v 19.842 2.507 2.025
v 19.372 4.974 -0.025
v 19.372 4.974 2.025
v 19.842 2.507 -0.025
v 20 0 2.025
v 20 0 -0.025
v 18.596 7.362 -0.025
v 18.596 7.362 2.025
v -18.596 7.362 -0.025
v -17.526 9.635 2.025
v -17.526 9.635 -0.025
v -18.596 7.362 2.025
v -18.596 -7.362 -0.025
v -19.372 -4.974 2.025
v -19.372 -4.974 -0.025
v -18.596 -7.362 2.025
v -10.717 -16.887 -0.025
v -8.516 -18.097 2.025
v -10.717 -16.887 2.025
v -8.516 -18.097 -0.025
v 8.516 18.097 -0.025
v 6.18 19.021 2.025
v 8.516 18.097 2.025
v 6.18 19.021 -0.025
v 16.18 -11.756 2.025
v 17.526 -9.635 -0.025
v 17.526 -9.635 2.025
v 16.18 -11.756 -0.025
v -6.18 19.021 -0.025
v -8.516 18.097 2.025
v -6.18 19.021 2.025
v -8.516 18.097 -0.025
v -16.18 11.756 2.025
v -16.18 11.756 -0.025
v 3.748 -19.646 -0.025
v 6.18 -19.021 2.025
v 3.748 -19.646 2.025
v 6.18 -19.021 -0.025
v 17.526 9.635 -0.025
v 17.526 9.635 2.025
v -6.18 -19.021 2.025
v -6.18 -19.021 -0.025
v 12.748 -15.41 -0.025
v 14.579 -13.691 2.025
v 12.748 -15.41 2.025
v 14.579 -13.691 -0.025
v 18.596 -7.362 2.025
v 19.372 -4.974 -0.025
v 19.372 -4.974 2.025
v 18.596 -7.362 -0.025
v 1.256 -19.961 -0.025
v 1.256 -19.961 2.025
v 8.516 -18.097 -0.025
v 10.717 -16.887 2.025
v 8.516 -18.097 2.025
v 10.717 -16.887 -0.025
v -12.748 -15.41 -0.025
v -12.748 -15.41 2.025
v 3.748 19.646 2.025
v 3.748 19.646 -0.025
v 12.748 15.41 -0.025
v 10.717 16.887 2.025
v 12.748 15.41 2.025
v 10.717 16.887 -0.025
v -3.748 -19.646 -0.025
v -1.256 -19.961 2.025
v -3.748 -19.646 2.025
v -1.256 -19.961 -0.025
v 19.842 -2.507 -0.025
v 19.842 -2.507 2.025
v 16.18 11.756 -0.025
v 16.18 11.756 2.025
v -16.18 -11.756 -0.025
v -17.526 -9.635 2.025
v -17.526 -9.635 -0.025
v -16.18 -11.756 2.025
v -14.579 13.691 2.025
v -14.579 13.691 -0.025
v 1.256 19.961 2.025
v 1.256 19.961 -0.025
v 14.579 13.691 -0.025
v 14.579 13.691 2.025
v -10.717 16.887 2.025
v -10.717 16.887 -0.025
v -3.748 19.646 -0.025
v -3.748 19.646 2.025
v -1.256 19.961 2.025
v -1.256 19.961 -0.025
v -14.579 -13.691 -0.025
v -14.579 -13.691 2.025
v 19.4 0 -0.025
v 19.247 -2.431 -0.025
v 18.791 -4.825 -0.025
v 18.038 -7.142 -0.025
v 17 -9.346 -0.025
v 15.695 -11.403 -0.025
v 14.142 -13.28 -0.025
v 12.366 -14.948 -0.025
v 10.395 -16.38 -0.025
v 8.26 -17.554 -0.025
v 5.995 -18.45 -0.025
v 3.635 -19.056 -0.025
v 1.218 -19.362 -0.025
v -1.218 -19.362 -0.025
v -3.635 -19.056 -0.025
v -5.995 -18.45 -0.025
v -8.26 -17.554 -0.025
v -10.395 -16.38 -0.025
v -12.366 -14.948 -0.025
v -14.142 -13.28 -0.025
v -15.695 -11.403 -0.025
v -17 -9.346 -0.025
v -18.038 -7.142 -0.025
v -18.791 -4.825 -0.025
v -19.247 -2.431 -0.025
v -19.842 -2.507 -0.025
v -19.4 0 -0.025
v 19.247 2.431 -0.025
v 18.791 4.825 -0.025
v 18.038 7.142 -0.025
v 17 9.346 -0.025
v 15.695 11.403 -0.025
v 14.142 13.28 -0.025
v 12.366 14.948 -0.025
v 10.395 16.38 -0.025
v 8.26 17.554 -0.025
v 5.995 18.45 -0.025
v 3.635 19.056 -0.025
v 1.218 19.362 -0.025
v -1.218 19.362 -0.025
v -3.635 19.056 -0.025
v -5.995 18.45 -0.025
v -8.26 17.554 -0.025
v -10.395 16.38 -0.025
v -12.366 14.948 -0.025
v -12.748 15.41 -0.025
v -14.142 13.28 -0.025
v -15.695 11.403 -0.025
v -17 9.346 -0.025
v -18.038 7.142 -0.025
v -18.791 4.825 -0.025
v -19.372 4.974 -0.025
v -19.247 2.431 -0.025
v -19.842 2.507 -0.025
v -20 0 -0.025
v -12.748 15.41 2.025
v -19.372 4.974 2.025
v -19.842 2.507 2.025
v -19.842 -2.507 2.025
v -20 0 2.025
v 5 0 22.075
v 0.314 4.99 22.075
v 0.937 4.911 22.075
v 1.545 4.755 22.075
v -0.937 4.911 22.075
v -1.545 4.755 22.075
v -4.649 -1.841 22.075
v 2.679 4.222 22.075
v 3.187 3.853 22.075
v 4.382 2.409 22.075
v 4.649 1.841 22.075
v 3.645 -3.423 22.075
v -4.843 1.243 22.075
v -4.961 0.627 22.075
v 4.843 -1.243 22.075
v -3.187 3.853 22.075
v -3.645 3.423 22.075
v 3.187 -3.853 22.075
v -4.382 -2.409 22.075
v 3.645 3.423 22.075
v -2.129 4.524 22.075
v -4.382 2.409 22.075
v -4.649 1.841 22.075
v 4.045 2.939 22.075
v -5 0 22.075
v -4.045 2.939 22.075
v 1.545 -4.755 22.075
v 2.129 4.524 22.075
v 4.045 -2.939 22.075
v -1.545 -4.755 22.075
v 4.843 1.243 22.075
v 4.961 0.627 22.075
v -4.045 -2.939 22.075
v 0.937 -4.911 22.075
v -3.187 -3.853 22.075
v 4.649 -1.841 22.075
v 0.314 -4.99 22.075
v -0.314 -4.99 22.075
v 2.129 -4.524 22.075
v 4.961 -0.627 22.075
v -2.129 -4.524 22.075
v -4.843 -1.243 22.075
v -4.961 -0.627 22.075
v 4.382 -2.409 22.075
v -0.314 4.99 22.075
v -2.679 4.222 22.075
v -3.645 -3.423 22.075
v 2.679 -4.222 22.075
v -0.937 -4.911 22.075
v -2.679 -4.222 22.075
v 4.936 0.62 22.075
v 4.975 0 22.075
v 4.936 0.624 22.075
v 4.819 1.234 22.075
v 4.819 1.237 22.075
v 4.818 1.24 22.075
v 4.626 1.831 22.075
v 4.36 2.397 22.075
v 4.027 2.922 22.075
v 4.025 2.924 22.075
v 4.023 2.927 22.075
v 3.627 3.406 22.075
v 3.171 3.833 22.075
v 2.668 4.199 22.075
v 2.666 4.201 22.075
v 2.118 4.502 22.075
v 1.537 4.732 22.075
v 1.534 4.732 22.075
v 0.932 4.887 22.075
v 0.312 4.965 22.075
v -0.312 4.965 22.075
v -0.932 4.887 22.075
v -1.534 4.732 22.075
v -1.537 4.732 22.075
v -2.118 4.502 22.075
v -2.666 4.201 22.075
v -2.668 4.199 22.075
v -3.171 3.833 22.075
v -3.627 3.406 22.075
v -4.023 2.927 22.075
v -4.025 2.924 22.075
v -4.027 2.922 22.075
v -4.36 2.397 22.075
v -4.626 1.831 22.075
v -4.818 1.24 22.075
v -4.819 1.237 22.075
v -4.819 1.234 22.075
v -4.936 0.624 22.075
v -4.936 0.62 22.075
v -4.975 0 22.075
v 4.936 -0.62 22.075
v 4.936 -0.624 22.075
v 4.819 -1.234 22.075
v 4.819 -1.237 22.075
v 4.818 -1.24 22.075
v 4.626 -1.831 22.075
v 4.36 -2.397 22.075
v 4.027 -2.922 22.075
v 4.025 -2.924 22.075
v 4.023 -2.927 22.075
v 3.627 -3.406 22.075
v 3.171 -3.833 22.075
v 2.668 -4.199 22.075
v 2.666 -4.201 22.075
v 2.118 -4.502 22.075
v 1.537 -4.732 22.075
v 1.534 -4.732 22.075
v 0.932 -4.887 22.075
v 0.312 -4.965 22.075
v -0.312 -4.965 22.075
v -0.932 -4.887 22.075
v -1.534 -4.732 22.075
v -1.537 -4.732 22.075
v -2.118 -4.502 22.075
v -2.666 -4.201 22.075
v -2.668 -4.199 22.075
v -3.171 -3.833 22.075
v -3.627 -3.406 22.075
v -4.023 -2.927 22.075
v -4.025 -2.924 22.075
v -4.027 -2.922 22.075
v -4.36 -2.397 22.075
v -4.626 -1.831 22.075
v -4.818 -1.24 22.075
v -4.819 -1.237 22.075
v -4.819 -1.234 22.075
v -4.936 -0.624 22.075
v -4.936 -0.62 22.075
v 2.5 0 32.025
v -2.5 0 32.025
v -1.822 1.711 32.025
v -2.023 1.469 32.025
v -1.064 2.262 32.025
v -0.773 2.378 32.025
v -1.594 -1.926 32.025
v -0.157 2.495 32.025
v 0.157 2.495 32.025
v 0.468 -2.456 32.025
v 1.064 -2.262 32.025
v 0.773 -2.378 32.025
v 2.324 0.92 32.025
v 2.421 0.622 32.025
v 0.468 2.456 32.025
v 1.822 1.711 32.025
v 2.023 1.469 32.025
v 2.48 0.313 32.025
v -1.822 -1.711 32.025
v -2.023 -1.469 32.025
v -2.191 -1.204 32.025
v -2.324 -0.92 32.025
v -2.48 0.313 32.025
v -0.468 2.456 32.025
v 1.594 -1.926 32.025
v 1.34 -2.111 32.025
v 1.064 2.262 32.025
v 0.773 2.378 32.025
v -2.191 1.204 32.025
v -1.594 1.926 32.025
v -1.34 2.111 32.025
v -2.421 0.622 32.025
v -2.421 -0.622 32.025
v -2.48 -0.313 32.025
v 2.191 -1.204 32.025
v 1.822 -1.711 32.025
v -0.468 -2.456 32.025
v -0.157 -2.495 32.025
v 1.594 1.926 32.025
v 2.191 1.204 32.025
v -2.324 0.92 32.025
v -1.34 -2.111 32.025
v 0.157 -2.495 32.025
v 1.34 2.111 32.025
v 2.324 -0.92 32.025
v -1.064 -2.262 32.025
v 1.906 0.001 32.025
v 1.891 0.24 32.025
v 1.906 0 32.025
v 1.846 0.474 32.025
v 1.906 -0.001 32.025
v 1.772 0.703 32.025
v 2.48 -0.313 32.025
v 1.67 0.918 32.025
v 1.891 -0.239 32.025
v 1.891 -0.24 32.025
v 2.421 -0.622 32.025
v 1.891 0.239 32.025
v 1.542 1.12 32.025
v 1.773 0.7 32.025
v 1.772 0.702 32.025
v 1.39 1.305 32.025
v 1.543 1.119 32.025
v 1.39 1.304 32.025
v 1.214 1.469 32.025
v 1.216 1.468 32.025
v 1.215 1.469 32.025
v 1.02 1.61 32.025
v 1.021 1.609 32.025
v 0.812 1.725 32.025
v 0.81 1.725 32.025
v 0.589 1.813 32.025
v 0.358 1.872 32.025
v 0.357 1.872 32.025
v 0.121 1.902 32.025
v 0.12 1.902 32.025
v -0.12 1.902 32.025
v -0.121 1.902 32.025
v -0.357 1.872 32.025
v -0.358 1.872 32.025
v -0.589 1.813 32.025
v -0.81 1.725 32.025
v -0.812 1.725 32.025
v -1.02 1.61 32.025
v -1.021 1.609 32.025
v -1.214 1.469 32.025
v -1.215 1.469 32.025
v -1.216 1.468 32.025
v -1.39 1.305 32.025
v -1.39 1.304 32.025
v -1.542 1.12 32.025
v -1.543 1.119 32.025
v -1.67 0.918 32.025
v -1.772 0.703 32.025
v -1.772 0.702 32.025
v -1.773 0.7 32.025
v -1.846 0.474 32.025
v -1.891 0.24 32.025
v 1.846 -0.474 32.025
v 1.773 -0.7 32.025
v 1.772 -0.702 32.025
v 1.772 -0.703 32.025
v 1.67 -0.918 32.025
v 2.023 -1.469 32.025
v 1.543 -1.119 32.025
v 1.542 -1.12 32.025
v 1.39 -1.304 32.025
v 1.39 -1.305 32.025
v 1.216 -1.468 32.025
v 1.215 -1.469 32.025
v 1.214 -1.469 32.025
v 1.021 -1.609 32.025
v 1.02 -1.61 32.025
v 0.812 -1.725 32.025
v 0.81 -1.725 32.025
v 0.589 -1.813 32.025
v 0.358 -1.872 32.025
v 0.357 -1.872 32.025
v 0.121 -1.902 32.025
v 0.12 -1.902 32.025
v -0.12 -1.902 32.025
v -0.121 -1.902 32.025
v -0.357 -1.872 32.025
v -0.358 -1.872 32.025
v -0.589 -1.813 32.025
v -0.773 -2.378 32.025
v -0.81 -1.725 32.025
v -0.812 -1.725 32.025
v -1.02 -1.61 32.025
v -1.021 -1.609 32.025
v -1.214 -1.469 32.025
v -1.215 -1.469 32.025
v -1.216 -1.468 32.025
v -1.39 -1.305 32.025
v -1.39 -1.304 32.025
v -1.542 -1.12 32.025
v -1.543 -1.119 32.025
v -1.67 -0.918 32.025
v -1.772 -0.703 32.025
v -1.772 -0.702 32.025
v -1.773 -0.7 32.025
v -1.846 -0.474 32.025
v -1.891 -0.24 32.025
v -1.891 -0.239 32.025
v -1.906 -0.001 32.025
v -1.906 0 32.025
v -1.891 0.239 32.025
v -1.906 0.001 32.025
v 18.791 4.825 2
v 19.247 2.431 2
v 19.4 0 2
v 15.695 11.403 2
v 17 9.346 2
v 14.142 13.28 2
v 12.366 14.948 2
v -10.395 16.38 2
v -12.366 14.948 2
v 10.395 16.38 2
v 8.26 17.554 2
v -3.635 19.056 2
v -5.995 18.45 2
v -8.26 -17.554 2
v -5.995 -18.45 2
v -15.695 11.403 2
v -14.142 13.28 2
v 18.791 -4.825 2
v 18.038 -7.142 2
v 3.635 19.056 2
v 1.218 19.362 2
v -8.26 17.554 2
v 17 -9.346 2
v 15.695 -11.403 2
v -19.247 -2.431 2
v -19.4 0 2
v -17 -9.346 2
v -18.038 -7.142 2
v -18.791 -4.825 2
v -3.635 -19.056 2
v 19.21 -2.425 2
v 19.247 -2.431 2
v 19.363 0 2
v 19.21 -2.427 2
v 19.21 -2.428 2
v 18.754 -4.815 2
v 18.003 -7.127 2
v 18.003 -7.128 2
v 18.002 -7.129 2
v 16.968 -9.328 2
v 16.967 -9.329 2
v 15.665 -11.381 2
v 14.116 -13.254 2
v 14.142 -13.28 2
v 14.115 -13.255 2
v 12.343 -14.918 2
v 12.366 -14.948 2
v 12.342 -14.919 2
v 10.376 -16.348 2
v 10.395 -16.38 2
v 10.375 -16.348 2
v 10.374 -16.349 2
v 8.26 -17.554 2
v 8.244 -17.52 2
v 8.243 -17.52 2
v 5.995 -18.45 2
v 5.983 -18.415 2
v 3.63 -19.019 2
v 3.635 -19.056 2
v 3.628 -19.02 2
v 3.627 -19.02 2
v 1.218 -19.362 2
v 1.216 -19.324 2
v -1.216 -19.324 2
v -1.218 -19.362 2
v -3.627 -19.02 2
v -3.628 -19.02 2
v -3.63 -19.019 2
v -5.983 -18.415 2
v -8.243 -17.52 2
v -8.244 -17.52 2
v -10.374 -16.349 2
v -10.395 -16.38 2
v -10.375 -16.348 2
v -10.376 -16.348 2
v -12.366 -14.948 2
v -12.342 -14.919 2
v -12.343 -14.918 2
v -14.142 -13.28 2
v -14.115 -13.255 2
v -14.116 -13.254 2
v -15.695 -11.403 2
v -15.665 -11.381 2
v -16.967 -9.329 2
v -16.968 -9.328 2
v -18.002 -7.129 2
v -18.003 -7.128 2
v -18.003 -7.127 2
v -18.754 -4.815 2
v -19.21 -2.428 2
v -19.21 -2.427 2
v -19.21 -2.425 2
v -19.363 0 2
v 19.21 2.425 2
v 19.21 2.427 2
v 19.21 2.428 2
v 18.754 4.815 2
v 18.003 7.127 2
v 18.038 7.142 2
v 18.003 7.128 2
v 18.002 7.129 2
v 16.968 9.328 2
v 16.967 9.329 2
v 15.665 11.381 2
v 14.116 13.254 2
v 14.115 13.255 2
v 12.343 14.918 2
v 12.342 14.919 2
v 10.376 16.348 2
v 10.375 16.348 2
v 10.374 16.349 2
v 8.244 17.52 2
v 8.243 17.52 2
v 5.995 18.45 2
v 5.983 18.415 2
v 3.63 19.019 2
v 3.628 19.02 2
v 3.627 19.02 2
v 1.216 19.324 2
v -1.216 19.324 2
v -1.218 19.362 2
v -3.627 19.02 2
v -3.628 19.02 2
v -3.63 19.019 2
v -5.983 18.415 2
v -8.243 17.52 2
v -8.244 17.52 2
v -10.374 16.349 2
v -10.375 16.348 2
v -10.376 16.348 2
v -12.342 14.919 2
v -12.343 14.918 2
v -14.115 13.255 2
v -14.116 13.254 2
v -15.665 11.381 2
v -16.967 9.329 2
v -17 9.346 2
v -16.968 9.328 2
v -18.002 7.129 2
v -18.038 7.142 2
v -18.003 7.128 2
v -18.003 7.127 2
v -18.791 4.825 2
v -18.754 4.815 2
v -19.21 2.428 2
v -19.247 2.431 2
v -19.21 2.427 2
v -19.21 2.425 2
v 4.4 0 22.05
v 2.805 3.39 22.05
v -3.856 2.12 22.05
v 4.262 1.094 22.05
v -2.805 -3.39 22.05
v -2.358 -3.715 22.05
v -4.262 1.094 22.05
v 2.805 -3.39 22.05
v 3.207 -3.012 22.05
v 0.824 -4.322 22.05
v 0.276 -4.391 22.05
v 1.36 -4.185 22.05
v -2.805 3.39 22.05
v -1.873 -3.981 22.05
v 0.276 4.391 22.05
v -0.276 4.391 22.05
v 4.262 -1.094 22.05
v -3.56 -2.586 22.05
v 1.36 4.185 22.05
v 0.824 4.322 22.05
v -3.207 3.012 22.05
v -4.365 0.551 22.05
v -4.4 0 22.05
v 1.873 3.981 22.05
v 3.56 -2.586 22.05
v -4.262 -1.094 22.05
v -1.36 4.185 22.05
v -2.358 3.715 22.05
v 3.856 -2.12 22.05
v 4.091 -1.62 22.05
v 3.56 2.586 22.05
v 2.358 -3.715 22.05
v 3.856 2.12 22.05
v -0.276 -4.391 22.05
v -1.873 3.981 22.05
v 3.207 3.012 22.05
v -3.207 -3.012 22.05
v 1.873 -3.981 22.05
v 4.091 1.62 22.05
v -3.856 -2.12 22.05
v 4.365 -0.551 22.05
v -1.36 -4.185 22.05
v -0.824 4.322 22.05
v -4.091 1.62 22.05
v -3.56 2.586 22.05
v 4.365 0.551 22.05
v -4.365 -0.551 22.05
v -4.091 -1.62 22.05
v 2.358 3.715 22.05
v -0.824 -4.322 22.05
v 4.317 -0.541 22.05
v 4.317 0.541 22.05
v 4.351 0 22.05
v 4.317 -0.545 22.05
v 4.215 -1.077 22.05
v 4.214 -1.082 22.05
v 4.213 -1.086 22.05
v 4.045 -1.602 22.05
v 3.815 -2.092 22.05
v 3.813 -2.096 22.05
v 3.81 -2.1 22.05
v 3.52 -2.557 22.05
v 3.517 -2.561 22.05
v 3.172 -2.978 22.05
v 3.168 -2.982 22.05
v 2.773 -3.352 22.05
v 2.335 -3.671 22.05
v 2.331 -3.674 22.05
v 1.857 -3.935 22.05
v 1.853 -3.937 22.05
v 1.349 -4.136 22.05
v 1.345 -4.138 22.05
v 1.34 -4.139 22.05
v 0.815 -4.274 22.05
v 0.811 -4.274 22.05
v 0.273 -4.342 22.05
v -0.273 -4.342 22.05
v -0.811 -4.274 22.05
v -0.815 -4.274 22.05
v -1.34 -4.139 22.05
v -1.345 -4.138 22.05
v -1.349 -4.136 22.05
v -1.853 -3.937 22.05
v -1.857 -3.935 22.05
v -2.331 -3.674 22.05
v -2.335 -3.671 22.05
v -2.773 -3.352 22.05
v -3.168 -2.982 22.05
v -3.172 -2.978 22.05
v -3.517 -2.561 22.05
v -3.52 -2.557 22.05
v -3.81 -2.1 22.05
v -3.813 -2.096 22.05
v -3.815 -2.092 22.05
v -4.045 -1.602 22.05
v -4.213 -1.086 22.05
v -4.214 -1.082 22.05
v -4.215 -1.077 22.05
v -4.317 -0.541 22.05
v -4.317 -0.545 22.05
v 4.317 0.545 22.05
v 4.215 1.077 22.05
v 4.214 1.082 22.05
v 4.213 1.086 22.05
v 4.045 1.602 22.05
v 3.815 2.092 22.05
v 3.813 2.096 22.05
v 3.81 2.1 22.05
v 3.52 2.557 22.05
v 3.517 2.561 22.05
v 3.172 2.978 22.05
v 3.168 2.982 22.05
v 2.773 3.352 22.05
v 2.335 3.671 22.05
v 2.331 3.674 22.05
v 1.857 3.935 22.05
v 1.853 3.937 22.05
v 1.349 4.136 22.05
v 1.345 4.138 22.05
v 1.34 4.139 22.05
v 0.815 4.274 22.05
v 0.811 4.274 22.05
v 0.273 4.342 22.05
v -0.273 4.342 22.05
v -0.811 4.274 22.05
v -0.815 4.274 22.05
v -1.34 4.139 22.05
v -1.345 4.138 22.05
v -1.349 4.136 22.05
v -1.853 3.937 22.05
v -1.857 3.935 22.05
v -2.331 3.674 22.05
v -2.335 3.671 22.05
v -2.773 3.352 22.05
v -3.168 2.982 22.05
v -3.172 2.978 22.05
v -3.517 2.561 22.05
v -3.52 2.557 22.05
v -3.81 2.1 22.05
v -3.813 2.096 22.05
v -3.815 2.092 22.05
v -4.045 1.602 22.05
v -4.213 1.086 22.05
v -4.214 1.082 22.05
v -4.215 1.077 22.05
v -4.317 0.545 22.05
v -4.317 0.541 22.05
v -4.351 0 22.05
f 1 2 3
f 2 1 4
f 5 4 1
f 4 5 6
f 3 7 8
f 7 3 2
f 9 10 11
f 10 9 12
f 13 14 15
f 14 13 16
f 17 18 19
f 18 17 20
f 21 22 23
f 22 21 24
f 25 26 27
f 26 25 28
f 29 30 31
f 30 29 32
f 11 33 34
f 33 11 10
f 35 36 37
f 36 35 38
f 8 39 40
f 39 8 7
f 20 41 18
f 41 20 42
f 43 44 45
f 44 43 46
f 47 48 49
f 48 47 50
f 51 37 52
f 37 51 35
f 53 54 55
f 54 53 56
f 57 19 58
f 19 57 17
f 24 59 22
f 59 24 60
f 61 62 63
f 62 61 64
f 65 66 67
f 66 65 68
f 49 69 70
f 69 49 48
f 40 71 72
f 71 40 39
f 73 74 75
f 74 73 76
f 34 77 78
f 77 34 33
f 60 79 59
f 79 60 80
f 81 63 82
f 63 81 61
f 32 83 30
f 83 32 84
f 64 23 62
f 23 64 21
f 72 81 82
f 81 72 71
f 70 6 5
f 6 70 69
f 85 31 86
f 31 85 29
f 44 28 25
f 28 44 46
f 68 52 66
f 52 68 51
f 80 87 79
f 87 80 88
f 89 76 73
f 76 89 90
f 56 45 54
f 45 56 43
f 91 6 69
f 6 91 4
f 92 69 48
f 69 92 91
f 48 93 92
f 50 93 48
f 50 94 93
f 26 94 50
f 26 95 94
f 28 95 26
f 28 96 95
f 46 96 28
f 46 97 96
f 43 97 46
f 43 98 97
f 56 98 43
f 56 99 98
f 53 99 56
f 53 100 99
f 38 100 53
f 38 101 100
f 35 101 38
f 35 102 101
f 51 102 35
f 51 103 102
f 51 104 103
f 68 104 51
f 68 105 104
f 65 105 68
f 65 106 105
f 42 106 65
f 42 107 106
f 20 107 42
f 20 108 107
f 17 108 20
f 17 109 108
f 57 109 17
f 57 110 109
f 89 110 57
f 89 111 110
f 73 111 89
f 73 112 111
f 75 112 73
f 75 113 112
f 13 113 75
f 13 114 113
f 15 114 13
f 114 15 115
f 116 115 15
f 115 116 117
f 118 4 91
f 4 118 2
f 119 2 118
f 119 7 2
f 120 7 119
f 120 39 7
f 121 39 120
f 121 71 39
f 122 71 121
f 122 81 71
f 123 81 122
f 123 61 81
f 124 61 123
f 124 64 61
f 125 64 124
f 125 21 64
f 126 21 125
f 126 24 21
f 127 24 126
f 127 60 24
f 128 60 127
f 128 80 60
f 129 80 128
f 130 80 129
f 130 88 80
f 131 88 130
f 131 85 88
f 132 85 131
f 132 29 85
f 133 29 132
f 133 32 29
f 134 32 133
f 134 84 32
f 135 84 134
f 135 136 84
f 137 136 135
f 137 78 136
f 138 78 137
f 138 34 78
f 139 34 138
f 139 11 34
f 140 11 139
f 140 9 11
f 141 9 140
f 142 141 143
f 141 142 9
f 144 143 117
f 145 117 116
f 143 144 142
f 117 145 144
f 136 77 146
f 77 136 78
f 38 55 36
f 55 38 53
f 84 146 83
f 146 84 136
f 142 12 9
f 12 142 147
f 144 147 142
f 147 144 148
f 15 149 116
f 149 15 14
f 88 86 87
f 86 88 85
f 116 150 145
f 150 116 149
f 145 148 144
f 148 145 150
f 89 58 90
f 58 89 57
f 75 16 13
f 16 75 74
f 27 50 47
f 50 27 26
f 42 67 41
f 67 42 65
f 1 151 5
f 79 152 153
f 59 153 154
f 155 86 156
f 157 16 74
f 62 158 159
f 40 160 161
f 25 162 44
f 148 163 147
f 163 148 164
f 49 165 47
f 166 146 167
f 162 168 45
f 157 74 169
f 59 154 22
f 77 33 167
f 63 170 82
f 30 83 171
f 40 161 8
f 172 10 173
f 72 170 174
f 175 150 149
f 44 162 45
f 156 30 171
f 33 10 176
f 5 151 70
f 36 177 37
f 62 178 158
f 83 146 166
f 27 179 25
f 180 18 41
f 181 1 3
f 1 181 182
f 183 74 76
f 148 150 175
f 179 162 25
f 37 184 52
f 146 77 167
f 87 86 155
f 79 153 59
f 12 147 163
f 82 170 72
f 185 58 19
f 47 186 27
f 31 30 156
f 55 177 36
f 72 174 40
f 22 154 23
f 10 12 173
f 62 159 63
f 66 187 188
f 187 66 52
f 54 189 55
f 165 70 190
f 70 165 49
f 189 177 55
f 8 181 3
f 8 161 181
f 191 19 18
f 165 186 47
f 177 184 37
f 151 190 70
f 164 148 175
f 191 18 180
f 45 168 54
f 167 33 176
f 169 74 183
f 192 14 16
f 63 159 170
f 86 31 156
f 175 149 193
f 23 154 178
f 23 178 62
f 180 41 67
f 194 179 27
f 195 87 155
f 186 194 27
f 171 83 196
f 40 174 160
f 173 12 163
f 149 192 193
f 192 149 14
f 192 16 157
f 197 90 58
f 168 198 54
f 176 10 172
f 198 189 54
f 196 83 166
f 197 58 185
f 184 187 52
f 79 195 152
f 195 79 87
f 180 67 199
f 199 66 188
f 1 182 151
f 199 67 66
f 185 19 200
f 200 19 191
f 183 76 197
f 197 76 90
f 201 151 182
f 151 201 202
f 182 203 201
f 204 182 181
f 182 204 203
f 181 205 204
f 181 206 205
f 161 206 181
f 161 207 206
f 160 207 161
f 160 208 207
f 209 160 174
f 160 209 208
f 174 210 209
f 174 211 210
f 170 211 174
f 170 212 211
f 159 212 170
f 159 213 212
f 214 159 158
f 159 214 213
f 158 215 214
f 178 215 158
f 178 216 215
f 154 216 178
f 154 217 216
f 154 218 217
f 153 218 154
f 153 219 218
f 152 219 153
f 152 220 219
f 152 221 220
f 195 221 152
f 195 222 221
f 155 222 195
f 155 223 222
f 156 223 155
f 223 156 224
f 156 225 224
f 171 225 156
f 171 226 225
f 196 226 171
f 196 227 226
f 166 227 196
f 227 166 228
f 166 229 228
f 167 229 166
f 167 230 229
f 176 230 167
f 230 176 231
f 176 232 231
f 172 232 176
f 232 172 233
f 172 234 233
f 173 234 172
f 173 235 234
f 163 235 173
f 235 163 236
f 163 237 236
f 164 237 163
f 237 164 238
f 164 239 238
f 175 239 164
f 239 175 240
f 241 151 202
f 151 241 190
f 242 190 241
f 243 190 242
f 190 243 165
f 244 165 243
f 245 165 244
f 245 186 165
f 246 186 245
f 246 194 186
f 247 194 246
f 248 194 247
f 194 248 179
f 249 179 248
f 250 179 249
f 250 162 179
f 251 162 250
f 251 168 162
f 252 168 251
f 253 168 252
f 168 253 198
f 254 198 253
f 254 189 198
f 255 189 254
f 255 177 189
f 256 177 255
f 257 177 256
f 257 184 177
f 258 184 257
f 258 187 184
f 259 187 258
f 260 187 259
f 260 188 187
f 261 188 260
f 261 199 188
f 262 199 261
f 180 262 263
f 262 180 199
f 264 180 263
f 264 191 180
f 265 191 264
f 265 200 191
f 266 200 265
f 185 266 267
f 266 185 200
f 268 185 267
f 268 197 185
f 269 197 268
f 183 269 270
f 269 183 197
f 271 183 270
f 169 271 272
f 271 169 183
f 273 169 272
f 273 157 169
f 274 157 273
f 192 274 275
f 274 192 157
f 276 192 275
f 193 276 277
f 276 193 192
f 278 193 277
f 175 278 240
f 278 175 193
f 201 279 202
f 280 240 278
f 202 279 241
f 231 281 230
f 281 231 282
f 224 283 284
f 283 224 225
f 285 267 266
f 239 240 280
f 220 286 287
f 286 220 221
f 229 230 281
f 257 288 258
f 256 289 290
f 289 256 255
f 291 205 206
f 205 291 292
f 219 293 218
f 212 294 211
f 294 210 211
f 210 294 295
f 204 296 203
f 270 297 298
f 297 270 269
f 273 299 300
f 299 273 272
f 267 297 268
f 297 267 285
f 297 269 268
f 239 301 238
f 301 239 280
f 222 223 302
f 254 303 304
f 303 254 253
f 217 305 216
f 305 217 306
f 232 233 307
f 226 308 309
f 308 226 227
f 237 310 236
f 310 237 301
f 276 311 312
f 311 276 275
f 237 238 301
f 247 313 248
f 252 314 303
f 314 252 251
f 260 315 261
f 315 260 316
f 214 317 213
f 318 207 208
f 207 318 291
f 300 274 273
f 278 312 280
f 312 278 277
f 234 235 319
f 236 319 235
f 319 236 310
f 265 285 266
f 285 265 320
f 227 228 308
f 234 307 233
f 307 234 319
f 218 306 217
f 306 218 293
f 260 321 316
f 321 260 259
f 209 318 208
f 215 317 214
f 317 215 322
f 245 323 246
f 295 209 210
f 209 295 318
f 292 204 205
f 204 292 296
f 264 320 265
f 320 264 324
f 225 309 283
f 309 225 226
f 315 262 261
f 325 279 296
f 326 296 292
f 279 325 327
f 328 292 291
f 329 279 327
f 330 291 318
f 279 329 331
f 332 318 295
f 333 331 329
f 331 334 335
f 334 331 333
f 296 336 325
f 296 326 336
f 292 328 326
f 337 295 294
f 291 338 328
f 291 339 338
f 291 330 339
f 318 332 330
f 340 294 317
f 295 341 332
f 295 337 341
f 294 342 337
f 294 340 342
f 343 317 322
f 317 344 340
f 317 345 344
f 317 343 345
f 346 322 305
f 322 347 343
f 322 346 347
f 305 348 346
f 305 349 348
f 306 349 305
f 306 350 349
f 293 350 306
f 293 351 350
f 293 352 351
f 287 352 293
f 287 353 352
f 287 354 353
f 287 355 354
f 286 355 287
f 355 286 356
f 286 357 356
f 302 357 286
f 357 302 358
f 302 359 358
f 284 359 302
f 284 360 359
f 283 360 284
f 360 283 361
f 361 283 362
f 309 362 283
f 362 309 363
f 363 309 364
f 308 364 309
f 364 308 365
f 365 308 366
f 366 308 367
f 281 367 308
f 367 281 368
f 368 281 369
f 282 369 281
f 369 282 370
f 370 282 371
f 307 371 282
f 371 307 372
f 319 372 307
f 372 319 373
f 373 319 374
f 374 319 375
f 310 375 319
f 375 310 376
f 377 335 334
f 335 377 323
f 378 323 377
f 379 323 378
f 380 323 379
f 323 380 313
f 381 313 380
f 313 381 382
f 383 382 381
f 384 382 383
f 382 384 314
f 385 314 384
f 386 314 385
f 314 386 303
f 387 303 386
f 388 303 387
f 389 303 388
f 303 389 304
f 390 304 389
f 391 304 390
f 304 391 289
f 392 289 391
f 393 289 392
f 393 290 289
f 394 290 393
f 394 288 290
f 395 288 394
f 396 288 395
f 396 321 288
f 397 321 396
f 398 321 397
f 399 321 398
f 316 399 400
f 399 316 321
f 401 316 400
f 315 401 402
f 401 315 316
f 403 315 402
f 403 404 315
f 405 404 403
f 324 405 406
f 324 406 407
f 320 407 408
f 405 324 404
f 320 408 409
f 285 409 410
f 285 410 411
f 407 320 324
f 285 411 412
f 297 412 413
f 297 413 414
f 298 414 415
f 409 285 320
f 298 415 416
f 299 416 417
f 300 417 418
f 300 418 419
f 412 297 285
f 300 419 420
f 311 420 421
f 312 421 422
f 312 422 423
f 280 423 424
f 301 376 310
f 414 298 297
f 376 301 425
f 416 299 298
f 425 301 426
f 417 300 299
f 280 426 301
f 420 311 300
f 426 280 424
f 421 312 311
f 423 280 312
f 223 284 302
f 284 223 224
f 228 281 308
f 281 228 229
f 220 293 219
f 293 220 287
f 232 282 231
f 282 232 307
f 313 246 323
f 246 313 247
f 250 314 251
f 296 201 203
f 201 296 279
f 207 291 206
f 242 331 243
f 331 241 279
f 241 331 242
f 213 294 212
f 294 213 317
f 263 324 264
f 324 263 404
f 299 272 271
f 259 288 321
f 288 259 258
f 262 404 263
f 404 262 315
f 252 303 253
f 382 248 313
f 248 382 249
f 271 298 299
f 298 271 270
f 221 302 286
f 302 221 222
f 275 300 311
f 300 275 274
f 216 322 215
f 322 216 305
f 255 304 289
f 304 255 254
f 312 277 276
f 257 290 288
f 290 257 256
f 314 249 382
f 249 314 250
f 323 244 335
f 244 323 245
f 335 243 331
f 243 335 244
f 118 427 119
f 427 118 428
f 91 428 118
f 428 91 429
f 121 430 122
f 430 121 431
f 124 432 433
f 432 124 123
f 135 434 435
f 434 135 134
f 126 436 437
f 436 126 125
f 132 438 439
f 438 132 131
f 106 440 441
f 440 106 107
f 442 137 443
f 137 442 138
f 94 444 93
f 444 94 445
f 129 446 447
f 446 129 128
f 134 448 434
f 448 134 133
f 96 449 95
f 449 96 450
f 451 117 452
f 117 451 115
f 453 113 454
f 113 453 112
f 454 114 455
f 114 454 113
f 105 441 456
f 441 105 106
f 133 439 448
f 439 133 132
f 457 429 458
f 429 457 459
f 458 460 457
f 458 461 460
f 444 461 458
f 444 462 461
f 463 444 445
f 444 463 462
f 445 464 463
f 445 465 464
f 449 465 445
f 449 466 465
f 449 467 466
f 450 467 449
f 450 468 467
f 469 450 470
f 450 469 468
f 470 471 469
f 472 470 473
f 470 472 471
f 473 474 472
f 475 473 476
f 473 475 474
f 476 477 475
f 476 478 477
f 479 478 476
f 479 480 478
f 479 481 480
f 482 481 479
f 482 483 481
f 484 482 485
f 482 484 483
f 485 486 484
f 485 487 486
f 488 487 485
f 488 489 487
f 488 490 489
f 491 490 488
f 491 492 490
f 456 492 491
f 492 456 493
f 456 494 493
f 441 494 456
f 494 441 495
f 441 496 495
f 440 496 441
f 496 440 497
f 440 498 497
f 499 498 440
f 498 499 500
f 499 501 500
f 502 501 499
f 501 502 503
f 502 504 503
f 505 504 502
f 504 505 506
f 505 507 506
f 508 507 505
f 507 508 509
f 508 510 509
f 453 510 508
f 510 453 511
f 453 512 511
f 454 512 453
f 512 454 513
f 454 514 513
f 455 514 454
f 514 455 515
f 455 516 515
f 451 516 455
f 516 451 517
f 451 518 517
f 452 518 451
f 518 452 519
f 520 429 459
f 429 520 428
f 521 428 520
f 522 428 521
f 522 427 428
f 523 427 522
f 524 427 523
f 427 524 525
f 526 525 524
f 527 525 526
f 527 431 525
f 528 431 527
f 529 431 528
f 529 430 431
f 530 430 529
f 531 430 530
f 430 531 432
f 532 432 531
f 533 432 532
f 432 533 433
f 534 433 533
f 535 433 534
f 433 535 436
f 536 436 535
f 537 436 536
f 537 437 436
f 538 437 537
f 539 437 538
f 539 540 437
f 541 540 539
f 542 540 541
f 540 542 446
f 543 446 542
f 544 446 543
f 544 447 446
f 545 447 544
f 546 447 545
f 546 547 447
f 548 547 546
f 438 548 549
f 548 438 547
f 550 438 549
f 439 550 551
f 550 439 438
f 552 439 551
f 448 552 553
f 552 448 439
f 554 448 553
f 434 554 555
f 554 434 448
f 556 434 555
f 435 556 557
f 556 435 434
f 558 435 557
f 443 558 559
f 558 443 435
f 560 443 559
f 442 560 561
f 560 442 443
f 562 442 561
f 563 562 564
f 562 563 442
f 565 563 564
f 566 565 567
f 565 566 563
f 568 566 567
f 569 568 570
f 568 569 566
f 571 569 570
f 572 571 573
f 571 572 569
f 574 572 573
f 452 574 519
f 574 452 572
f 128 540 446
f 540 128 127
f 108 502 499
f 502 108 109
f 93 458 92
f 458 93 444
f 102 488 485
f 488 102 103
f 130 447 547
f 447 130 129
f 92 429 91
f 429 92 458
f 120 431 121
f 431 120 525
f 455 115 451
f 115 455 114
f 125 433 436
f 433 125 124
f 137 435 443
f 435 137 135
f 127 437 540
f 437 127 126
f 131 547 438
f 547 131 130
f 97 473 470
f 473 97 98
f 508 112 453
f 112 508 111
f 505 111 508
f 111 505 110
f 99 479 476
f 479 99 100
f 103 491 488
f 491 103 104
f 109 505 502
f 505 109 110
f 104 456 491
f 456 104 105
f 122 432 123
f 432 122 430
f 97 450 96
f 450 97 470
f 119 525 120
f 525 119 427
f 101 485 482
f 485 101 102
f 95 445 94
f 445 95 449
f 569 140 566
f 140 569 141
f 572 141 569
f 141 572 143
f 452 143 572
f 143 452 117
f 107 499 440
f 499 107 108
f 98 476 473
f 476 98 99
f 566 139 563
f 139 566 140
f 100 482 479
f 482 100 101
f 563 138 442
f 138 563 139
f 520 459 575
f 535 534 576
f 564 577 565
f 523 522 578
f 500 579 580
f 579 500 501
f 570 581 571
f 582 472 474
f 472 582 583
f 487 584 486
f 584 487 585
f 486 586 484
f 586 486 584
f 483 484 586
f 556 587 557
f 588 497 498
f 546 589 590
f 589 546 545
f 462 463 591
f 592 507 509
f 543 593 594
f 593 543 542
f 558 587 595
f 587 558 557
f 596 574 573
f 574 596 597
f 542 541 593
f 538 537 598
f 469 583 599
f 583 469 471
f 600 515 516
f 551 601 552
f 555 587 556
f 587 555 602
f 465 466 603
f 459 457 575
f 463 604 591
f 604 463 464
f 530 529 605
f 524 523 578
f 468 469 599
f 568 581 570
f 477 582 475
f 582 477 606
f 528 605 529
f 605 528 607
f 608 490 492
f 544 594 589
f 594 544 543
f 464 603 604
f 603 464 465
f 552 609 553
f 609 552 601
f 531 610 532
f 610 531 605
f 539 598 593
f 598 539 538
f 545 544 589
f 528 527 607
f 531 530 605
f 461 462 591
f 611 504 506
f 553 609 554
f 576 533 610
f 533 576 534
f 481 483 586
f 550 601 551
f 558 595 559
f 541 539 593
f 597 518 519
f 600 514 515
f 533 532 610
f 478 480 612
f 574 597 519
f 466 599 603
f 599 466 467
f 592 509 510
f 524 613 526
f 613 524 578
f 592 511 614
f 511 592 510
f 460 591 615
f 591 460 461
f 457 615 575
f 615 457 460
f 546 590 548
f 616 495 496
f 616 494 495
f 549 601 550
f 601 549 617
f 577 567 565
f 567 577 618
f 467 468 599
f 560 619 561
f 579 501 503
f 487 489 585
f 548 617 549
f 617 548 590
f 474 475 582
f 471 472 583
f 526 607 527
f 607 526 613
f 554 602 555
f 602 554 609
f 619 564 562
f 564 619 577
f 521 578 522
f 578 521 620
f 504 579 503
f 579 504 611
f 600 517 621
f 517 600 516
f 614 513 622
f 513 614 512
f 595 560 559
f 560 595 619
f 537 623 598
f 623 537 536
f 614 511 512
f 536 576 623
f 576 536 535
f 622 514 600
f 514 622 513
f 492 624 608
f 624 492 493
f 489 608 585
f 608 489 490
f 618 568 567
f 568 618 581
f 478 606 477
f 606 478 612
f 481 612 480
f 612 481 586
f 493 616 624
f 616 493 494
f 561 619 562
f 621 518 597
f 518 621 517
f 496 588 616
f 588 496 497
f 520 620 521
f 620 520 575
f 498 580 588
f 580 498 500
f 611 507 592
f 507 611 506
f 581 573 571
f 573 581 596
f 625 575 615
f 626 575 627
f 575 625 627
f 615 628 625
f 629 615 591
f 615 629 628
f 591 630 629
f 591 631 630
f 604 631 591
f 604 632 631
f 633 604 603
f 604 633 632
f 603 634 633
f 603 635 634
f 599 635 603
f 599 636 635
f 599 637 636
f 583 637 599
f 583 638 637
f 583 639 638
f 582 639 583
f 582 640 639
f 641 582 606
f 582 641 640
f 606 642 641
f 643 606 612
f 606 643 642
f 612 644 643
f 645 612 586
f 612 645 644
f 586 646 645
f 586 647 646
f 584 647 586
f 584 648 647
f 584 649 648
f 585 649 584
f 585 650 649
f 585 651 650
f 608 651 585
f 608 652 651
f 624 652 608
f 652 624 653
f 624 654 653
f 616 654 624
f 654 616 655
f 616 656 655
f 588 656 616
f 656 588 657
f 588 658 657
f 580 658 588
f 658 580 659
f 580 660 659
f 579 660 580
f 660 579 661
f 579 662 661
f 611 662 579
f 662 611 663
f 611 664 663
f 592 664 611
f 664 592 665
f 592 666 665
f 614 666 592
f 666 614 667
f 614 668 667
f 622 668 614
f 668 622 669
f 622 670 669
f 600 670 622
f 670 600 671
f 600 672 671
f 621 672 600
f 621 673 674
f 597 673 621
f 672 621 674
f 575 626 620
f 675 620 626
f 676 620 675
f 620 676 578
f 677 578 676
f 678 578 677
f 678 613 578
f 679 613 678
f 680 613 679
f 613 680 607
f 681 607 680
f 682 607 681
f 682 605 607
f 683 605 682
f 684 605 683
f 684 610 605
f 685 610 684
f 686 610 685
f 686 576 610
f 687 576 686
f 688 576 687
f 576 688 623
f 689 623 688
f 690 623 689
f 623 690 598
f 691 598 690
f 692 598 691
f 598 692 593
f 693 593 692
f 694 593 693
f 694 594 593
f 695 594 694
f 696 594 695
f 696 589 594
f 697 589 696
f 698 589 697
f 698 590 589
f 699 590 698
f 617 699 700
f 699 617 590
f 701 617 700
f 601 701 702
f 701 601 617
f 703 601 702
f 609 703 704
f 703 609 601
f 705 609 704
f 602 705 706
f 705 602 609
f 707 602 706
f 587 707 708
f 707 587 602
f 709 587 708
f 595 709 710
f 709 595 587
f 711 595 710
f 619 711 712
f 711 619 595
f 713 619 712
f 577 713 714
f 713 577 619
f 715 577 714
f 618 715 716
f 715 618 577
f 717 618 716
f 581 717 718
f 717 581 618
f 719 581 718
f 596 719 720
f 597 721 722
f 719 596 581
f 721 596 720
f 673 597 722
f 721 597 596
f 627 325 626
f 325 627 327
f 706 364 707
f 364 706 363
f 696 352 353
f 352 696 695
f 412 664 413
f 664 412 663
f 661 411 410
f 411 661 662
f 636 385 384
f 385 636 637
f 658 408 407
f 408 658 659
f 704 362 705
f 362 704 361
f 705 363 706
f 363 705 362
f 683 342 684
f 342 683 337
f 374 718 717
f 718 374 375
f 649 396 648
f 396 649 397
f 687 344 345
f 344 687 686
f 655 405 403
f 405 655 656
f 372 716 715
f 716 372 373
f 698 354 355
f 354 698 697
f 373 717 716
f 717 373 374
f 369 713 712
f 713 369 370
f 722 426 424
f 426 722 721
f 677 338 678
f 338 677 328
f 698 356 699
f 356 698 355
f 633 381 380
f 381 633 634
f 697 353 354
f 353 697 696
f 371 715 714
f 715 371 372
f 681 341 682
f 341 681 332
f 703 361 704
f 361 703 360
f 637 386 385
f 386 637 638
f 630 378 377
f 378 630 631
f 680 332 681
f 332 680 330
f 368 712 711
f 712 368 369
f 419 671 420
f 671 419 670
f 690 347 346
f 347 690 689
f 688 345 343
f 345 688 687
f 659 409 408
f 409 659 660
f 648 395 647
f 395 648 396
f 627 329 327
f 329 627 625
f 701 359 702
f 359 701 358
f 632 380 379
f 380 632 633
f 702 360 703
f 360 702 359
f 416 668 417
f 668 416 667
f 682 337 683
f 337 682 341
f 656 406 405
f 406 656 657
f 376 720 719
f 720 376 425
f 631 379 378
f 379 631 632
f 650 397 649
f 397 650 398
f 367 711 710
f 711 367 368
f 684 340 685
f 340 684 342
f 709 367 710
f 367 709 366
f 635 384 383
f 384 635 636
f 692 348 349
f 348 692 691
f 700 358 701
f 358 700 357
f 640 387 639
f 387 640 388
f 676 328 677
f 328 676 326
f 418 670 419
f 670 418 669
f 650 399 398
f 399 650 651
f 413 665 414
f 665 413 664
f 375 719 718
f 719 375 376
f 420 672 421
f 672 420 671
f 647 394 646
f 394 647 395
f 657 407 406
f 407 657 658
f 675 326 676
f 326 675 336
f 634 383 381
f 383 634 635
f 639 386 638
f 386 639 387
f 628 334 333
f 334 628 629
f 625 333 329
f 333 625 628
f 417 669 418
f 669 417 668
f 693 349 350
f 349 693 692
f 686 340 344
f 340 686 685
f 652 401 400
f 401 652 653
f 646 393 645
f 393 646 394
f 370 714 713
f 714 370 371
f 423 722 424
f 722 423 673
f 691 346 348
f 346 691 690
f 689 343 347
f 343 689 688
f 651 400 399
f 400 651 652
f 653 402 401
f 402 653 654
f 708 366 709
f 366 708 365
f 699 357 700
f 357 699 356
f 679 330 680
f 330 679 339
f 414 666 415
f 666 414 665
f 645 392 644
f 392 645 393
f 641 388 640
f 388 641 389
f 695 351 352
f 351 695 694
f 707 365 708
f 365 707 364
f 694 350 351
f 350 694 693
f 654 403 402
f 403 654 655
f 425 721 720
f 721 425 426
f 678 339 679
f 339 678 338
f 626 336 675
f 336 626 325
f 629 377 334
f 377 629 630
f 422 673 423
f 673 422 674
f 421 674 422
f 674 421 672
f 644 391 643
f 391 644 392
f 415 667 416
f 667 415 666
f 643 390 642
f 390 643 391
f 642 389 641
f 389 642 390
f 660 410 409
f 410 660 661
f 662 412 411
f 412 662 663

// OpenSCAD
//copyright 2014 Richard Swika (a.k.a. Zick)
//All Rights Reserved
//Rev. Orig - Augest 19, 2014 - Good for bottom filling resin molds
/* [Global] */

//Diameter of funnel mouth? (mm)
funnelTopD = 40; //[10:200]

//Length of funnel mouth? (mm)
funnelTopL = 2; //[0:200]

//Diameter at bottom of funnel taper? (mm)
funnelBottomD = 10; //[5:200]

//Length of funnel taper? (mm)
funnelL = 20; //[10:200]

//Diameter of egress? (mm)
egressD= 5; //[5:200]

//Length of egress? (mm)
egressL = 10; //[0:200]

//Thickness of walls? (micron)
wallT = 400; //[300:5000] 

/* [Private] */
tiny=0.05;
$fn=50;
module funnel()
{
	translate([0,0,0]) 
		difference(){
		union(){
			translate([0,0,(funnelTopL)/2]) 
			cylinder(d=funnelTopD,h=funnelTopL+tiny,center=true);
			translate([0,0,tiny+funnelTopL+funnelL/2]) 
			cylinder(d1=funnelTopD,d2=funnelBottomD,h=funnelL+tiny,center=true);
			translate([0,0,funnelTopL+funnelL+egressL/2]) 
			cylinder(d1=funnelBottomD,d2=egressD,h=egressL+tiny,center=true);
		}
		translate([0,0,-tiny])
		union(){
			translate([0,0,(funnelTopL)/2]) 
			cylinder(d=funnelTopD-wallT*0.003,h=funnelTopL+2*tiny,center=true);
			translate([0,0,tiny+funnelTopL+funnelL/2]) 
			cylinder(d1=funnelTopD-wallT*0.003,d2=funnelBottomD-wallT*0.003,h=funnelL+2*tiny,center=true);
			translate([0,0,funnelTopL+funnelL+egressL/2]) 
			cylinder(d1=funnelBottomD-wallT*0.003,d2=egressD-wallT*0.003,h=egressL+4*tiny,center=true);
		}

	}
}

rotate([0,0,0]) funnel();
